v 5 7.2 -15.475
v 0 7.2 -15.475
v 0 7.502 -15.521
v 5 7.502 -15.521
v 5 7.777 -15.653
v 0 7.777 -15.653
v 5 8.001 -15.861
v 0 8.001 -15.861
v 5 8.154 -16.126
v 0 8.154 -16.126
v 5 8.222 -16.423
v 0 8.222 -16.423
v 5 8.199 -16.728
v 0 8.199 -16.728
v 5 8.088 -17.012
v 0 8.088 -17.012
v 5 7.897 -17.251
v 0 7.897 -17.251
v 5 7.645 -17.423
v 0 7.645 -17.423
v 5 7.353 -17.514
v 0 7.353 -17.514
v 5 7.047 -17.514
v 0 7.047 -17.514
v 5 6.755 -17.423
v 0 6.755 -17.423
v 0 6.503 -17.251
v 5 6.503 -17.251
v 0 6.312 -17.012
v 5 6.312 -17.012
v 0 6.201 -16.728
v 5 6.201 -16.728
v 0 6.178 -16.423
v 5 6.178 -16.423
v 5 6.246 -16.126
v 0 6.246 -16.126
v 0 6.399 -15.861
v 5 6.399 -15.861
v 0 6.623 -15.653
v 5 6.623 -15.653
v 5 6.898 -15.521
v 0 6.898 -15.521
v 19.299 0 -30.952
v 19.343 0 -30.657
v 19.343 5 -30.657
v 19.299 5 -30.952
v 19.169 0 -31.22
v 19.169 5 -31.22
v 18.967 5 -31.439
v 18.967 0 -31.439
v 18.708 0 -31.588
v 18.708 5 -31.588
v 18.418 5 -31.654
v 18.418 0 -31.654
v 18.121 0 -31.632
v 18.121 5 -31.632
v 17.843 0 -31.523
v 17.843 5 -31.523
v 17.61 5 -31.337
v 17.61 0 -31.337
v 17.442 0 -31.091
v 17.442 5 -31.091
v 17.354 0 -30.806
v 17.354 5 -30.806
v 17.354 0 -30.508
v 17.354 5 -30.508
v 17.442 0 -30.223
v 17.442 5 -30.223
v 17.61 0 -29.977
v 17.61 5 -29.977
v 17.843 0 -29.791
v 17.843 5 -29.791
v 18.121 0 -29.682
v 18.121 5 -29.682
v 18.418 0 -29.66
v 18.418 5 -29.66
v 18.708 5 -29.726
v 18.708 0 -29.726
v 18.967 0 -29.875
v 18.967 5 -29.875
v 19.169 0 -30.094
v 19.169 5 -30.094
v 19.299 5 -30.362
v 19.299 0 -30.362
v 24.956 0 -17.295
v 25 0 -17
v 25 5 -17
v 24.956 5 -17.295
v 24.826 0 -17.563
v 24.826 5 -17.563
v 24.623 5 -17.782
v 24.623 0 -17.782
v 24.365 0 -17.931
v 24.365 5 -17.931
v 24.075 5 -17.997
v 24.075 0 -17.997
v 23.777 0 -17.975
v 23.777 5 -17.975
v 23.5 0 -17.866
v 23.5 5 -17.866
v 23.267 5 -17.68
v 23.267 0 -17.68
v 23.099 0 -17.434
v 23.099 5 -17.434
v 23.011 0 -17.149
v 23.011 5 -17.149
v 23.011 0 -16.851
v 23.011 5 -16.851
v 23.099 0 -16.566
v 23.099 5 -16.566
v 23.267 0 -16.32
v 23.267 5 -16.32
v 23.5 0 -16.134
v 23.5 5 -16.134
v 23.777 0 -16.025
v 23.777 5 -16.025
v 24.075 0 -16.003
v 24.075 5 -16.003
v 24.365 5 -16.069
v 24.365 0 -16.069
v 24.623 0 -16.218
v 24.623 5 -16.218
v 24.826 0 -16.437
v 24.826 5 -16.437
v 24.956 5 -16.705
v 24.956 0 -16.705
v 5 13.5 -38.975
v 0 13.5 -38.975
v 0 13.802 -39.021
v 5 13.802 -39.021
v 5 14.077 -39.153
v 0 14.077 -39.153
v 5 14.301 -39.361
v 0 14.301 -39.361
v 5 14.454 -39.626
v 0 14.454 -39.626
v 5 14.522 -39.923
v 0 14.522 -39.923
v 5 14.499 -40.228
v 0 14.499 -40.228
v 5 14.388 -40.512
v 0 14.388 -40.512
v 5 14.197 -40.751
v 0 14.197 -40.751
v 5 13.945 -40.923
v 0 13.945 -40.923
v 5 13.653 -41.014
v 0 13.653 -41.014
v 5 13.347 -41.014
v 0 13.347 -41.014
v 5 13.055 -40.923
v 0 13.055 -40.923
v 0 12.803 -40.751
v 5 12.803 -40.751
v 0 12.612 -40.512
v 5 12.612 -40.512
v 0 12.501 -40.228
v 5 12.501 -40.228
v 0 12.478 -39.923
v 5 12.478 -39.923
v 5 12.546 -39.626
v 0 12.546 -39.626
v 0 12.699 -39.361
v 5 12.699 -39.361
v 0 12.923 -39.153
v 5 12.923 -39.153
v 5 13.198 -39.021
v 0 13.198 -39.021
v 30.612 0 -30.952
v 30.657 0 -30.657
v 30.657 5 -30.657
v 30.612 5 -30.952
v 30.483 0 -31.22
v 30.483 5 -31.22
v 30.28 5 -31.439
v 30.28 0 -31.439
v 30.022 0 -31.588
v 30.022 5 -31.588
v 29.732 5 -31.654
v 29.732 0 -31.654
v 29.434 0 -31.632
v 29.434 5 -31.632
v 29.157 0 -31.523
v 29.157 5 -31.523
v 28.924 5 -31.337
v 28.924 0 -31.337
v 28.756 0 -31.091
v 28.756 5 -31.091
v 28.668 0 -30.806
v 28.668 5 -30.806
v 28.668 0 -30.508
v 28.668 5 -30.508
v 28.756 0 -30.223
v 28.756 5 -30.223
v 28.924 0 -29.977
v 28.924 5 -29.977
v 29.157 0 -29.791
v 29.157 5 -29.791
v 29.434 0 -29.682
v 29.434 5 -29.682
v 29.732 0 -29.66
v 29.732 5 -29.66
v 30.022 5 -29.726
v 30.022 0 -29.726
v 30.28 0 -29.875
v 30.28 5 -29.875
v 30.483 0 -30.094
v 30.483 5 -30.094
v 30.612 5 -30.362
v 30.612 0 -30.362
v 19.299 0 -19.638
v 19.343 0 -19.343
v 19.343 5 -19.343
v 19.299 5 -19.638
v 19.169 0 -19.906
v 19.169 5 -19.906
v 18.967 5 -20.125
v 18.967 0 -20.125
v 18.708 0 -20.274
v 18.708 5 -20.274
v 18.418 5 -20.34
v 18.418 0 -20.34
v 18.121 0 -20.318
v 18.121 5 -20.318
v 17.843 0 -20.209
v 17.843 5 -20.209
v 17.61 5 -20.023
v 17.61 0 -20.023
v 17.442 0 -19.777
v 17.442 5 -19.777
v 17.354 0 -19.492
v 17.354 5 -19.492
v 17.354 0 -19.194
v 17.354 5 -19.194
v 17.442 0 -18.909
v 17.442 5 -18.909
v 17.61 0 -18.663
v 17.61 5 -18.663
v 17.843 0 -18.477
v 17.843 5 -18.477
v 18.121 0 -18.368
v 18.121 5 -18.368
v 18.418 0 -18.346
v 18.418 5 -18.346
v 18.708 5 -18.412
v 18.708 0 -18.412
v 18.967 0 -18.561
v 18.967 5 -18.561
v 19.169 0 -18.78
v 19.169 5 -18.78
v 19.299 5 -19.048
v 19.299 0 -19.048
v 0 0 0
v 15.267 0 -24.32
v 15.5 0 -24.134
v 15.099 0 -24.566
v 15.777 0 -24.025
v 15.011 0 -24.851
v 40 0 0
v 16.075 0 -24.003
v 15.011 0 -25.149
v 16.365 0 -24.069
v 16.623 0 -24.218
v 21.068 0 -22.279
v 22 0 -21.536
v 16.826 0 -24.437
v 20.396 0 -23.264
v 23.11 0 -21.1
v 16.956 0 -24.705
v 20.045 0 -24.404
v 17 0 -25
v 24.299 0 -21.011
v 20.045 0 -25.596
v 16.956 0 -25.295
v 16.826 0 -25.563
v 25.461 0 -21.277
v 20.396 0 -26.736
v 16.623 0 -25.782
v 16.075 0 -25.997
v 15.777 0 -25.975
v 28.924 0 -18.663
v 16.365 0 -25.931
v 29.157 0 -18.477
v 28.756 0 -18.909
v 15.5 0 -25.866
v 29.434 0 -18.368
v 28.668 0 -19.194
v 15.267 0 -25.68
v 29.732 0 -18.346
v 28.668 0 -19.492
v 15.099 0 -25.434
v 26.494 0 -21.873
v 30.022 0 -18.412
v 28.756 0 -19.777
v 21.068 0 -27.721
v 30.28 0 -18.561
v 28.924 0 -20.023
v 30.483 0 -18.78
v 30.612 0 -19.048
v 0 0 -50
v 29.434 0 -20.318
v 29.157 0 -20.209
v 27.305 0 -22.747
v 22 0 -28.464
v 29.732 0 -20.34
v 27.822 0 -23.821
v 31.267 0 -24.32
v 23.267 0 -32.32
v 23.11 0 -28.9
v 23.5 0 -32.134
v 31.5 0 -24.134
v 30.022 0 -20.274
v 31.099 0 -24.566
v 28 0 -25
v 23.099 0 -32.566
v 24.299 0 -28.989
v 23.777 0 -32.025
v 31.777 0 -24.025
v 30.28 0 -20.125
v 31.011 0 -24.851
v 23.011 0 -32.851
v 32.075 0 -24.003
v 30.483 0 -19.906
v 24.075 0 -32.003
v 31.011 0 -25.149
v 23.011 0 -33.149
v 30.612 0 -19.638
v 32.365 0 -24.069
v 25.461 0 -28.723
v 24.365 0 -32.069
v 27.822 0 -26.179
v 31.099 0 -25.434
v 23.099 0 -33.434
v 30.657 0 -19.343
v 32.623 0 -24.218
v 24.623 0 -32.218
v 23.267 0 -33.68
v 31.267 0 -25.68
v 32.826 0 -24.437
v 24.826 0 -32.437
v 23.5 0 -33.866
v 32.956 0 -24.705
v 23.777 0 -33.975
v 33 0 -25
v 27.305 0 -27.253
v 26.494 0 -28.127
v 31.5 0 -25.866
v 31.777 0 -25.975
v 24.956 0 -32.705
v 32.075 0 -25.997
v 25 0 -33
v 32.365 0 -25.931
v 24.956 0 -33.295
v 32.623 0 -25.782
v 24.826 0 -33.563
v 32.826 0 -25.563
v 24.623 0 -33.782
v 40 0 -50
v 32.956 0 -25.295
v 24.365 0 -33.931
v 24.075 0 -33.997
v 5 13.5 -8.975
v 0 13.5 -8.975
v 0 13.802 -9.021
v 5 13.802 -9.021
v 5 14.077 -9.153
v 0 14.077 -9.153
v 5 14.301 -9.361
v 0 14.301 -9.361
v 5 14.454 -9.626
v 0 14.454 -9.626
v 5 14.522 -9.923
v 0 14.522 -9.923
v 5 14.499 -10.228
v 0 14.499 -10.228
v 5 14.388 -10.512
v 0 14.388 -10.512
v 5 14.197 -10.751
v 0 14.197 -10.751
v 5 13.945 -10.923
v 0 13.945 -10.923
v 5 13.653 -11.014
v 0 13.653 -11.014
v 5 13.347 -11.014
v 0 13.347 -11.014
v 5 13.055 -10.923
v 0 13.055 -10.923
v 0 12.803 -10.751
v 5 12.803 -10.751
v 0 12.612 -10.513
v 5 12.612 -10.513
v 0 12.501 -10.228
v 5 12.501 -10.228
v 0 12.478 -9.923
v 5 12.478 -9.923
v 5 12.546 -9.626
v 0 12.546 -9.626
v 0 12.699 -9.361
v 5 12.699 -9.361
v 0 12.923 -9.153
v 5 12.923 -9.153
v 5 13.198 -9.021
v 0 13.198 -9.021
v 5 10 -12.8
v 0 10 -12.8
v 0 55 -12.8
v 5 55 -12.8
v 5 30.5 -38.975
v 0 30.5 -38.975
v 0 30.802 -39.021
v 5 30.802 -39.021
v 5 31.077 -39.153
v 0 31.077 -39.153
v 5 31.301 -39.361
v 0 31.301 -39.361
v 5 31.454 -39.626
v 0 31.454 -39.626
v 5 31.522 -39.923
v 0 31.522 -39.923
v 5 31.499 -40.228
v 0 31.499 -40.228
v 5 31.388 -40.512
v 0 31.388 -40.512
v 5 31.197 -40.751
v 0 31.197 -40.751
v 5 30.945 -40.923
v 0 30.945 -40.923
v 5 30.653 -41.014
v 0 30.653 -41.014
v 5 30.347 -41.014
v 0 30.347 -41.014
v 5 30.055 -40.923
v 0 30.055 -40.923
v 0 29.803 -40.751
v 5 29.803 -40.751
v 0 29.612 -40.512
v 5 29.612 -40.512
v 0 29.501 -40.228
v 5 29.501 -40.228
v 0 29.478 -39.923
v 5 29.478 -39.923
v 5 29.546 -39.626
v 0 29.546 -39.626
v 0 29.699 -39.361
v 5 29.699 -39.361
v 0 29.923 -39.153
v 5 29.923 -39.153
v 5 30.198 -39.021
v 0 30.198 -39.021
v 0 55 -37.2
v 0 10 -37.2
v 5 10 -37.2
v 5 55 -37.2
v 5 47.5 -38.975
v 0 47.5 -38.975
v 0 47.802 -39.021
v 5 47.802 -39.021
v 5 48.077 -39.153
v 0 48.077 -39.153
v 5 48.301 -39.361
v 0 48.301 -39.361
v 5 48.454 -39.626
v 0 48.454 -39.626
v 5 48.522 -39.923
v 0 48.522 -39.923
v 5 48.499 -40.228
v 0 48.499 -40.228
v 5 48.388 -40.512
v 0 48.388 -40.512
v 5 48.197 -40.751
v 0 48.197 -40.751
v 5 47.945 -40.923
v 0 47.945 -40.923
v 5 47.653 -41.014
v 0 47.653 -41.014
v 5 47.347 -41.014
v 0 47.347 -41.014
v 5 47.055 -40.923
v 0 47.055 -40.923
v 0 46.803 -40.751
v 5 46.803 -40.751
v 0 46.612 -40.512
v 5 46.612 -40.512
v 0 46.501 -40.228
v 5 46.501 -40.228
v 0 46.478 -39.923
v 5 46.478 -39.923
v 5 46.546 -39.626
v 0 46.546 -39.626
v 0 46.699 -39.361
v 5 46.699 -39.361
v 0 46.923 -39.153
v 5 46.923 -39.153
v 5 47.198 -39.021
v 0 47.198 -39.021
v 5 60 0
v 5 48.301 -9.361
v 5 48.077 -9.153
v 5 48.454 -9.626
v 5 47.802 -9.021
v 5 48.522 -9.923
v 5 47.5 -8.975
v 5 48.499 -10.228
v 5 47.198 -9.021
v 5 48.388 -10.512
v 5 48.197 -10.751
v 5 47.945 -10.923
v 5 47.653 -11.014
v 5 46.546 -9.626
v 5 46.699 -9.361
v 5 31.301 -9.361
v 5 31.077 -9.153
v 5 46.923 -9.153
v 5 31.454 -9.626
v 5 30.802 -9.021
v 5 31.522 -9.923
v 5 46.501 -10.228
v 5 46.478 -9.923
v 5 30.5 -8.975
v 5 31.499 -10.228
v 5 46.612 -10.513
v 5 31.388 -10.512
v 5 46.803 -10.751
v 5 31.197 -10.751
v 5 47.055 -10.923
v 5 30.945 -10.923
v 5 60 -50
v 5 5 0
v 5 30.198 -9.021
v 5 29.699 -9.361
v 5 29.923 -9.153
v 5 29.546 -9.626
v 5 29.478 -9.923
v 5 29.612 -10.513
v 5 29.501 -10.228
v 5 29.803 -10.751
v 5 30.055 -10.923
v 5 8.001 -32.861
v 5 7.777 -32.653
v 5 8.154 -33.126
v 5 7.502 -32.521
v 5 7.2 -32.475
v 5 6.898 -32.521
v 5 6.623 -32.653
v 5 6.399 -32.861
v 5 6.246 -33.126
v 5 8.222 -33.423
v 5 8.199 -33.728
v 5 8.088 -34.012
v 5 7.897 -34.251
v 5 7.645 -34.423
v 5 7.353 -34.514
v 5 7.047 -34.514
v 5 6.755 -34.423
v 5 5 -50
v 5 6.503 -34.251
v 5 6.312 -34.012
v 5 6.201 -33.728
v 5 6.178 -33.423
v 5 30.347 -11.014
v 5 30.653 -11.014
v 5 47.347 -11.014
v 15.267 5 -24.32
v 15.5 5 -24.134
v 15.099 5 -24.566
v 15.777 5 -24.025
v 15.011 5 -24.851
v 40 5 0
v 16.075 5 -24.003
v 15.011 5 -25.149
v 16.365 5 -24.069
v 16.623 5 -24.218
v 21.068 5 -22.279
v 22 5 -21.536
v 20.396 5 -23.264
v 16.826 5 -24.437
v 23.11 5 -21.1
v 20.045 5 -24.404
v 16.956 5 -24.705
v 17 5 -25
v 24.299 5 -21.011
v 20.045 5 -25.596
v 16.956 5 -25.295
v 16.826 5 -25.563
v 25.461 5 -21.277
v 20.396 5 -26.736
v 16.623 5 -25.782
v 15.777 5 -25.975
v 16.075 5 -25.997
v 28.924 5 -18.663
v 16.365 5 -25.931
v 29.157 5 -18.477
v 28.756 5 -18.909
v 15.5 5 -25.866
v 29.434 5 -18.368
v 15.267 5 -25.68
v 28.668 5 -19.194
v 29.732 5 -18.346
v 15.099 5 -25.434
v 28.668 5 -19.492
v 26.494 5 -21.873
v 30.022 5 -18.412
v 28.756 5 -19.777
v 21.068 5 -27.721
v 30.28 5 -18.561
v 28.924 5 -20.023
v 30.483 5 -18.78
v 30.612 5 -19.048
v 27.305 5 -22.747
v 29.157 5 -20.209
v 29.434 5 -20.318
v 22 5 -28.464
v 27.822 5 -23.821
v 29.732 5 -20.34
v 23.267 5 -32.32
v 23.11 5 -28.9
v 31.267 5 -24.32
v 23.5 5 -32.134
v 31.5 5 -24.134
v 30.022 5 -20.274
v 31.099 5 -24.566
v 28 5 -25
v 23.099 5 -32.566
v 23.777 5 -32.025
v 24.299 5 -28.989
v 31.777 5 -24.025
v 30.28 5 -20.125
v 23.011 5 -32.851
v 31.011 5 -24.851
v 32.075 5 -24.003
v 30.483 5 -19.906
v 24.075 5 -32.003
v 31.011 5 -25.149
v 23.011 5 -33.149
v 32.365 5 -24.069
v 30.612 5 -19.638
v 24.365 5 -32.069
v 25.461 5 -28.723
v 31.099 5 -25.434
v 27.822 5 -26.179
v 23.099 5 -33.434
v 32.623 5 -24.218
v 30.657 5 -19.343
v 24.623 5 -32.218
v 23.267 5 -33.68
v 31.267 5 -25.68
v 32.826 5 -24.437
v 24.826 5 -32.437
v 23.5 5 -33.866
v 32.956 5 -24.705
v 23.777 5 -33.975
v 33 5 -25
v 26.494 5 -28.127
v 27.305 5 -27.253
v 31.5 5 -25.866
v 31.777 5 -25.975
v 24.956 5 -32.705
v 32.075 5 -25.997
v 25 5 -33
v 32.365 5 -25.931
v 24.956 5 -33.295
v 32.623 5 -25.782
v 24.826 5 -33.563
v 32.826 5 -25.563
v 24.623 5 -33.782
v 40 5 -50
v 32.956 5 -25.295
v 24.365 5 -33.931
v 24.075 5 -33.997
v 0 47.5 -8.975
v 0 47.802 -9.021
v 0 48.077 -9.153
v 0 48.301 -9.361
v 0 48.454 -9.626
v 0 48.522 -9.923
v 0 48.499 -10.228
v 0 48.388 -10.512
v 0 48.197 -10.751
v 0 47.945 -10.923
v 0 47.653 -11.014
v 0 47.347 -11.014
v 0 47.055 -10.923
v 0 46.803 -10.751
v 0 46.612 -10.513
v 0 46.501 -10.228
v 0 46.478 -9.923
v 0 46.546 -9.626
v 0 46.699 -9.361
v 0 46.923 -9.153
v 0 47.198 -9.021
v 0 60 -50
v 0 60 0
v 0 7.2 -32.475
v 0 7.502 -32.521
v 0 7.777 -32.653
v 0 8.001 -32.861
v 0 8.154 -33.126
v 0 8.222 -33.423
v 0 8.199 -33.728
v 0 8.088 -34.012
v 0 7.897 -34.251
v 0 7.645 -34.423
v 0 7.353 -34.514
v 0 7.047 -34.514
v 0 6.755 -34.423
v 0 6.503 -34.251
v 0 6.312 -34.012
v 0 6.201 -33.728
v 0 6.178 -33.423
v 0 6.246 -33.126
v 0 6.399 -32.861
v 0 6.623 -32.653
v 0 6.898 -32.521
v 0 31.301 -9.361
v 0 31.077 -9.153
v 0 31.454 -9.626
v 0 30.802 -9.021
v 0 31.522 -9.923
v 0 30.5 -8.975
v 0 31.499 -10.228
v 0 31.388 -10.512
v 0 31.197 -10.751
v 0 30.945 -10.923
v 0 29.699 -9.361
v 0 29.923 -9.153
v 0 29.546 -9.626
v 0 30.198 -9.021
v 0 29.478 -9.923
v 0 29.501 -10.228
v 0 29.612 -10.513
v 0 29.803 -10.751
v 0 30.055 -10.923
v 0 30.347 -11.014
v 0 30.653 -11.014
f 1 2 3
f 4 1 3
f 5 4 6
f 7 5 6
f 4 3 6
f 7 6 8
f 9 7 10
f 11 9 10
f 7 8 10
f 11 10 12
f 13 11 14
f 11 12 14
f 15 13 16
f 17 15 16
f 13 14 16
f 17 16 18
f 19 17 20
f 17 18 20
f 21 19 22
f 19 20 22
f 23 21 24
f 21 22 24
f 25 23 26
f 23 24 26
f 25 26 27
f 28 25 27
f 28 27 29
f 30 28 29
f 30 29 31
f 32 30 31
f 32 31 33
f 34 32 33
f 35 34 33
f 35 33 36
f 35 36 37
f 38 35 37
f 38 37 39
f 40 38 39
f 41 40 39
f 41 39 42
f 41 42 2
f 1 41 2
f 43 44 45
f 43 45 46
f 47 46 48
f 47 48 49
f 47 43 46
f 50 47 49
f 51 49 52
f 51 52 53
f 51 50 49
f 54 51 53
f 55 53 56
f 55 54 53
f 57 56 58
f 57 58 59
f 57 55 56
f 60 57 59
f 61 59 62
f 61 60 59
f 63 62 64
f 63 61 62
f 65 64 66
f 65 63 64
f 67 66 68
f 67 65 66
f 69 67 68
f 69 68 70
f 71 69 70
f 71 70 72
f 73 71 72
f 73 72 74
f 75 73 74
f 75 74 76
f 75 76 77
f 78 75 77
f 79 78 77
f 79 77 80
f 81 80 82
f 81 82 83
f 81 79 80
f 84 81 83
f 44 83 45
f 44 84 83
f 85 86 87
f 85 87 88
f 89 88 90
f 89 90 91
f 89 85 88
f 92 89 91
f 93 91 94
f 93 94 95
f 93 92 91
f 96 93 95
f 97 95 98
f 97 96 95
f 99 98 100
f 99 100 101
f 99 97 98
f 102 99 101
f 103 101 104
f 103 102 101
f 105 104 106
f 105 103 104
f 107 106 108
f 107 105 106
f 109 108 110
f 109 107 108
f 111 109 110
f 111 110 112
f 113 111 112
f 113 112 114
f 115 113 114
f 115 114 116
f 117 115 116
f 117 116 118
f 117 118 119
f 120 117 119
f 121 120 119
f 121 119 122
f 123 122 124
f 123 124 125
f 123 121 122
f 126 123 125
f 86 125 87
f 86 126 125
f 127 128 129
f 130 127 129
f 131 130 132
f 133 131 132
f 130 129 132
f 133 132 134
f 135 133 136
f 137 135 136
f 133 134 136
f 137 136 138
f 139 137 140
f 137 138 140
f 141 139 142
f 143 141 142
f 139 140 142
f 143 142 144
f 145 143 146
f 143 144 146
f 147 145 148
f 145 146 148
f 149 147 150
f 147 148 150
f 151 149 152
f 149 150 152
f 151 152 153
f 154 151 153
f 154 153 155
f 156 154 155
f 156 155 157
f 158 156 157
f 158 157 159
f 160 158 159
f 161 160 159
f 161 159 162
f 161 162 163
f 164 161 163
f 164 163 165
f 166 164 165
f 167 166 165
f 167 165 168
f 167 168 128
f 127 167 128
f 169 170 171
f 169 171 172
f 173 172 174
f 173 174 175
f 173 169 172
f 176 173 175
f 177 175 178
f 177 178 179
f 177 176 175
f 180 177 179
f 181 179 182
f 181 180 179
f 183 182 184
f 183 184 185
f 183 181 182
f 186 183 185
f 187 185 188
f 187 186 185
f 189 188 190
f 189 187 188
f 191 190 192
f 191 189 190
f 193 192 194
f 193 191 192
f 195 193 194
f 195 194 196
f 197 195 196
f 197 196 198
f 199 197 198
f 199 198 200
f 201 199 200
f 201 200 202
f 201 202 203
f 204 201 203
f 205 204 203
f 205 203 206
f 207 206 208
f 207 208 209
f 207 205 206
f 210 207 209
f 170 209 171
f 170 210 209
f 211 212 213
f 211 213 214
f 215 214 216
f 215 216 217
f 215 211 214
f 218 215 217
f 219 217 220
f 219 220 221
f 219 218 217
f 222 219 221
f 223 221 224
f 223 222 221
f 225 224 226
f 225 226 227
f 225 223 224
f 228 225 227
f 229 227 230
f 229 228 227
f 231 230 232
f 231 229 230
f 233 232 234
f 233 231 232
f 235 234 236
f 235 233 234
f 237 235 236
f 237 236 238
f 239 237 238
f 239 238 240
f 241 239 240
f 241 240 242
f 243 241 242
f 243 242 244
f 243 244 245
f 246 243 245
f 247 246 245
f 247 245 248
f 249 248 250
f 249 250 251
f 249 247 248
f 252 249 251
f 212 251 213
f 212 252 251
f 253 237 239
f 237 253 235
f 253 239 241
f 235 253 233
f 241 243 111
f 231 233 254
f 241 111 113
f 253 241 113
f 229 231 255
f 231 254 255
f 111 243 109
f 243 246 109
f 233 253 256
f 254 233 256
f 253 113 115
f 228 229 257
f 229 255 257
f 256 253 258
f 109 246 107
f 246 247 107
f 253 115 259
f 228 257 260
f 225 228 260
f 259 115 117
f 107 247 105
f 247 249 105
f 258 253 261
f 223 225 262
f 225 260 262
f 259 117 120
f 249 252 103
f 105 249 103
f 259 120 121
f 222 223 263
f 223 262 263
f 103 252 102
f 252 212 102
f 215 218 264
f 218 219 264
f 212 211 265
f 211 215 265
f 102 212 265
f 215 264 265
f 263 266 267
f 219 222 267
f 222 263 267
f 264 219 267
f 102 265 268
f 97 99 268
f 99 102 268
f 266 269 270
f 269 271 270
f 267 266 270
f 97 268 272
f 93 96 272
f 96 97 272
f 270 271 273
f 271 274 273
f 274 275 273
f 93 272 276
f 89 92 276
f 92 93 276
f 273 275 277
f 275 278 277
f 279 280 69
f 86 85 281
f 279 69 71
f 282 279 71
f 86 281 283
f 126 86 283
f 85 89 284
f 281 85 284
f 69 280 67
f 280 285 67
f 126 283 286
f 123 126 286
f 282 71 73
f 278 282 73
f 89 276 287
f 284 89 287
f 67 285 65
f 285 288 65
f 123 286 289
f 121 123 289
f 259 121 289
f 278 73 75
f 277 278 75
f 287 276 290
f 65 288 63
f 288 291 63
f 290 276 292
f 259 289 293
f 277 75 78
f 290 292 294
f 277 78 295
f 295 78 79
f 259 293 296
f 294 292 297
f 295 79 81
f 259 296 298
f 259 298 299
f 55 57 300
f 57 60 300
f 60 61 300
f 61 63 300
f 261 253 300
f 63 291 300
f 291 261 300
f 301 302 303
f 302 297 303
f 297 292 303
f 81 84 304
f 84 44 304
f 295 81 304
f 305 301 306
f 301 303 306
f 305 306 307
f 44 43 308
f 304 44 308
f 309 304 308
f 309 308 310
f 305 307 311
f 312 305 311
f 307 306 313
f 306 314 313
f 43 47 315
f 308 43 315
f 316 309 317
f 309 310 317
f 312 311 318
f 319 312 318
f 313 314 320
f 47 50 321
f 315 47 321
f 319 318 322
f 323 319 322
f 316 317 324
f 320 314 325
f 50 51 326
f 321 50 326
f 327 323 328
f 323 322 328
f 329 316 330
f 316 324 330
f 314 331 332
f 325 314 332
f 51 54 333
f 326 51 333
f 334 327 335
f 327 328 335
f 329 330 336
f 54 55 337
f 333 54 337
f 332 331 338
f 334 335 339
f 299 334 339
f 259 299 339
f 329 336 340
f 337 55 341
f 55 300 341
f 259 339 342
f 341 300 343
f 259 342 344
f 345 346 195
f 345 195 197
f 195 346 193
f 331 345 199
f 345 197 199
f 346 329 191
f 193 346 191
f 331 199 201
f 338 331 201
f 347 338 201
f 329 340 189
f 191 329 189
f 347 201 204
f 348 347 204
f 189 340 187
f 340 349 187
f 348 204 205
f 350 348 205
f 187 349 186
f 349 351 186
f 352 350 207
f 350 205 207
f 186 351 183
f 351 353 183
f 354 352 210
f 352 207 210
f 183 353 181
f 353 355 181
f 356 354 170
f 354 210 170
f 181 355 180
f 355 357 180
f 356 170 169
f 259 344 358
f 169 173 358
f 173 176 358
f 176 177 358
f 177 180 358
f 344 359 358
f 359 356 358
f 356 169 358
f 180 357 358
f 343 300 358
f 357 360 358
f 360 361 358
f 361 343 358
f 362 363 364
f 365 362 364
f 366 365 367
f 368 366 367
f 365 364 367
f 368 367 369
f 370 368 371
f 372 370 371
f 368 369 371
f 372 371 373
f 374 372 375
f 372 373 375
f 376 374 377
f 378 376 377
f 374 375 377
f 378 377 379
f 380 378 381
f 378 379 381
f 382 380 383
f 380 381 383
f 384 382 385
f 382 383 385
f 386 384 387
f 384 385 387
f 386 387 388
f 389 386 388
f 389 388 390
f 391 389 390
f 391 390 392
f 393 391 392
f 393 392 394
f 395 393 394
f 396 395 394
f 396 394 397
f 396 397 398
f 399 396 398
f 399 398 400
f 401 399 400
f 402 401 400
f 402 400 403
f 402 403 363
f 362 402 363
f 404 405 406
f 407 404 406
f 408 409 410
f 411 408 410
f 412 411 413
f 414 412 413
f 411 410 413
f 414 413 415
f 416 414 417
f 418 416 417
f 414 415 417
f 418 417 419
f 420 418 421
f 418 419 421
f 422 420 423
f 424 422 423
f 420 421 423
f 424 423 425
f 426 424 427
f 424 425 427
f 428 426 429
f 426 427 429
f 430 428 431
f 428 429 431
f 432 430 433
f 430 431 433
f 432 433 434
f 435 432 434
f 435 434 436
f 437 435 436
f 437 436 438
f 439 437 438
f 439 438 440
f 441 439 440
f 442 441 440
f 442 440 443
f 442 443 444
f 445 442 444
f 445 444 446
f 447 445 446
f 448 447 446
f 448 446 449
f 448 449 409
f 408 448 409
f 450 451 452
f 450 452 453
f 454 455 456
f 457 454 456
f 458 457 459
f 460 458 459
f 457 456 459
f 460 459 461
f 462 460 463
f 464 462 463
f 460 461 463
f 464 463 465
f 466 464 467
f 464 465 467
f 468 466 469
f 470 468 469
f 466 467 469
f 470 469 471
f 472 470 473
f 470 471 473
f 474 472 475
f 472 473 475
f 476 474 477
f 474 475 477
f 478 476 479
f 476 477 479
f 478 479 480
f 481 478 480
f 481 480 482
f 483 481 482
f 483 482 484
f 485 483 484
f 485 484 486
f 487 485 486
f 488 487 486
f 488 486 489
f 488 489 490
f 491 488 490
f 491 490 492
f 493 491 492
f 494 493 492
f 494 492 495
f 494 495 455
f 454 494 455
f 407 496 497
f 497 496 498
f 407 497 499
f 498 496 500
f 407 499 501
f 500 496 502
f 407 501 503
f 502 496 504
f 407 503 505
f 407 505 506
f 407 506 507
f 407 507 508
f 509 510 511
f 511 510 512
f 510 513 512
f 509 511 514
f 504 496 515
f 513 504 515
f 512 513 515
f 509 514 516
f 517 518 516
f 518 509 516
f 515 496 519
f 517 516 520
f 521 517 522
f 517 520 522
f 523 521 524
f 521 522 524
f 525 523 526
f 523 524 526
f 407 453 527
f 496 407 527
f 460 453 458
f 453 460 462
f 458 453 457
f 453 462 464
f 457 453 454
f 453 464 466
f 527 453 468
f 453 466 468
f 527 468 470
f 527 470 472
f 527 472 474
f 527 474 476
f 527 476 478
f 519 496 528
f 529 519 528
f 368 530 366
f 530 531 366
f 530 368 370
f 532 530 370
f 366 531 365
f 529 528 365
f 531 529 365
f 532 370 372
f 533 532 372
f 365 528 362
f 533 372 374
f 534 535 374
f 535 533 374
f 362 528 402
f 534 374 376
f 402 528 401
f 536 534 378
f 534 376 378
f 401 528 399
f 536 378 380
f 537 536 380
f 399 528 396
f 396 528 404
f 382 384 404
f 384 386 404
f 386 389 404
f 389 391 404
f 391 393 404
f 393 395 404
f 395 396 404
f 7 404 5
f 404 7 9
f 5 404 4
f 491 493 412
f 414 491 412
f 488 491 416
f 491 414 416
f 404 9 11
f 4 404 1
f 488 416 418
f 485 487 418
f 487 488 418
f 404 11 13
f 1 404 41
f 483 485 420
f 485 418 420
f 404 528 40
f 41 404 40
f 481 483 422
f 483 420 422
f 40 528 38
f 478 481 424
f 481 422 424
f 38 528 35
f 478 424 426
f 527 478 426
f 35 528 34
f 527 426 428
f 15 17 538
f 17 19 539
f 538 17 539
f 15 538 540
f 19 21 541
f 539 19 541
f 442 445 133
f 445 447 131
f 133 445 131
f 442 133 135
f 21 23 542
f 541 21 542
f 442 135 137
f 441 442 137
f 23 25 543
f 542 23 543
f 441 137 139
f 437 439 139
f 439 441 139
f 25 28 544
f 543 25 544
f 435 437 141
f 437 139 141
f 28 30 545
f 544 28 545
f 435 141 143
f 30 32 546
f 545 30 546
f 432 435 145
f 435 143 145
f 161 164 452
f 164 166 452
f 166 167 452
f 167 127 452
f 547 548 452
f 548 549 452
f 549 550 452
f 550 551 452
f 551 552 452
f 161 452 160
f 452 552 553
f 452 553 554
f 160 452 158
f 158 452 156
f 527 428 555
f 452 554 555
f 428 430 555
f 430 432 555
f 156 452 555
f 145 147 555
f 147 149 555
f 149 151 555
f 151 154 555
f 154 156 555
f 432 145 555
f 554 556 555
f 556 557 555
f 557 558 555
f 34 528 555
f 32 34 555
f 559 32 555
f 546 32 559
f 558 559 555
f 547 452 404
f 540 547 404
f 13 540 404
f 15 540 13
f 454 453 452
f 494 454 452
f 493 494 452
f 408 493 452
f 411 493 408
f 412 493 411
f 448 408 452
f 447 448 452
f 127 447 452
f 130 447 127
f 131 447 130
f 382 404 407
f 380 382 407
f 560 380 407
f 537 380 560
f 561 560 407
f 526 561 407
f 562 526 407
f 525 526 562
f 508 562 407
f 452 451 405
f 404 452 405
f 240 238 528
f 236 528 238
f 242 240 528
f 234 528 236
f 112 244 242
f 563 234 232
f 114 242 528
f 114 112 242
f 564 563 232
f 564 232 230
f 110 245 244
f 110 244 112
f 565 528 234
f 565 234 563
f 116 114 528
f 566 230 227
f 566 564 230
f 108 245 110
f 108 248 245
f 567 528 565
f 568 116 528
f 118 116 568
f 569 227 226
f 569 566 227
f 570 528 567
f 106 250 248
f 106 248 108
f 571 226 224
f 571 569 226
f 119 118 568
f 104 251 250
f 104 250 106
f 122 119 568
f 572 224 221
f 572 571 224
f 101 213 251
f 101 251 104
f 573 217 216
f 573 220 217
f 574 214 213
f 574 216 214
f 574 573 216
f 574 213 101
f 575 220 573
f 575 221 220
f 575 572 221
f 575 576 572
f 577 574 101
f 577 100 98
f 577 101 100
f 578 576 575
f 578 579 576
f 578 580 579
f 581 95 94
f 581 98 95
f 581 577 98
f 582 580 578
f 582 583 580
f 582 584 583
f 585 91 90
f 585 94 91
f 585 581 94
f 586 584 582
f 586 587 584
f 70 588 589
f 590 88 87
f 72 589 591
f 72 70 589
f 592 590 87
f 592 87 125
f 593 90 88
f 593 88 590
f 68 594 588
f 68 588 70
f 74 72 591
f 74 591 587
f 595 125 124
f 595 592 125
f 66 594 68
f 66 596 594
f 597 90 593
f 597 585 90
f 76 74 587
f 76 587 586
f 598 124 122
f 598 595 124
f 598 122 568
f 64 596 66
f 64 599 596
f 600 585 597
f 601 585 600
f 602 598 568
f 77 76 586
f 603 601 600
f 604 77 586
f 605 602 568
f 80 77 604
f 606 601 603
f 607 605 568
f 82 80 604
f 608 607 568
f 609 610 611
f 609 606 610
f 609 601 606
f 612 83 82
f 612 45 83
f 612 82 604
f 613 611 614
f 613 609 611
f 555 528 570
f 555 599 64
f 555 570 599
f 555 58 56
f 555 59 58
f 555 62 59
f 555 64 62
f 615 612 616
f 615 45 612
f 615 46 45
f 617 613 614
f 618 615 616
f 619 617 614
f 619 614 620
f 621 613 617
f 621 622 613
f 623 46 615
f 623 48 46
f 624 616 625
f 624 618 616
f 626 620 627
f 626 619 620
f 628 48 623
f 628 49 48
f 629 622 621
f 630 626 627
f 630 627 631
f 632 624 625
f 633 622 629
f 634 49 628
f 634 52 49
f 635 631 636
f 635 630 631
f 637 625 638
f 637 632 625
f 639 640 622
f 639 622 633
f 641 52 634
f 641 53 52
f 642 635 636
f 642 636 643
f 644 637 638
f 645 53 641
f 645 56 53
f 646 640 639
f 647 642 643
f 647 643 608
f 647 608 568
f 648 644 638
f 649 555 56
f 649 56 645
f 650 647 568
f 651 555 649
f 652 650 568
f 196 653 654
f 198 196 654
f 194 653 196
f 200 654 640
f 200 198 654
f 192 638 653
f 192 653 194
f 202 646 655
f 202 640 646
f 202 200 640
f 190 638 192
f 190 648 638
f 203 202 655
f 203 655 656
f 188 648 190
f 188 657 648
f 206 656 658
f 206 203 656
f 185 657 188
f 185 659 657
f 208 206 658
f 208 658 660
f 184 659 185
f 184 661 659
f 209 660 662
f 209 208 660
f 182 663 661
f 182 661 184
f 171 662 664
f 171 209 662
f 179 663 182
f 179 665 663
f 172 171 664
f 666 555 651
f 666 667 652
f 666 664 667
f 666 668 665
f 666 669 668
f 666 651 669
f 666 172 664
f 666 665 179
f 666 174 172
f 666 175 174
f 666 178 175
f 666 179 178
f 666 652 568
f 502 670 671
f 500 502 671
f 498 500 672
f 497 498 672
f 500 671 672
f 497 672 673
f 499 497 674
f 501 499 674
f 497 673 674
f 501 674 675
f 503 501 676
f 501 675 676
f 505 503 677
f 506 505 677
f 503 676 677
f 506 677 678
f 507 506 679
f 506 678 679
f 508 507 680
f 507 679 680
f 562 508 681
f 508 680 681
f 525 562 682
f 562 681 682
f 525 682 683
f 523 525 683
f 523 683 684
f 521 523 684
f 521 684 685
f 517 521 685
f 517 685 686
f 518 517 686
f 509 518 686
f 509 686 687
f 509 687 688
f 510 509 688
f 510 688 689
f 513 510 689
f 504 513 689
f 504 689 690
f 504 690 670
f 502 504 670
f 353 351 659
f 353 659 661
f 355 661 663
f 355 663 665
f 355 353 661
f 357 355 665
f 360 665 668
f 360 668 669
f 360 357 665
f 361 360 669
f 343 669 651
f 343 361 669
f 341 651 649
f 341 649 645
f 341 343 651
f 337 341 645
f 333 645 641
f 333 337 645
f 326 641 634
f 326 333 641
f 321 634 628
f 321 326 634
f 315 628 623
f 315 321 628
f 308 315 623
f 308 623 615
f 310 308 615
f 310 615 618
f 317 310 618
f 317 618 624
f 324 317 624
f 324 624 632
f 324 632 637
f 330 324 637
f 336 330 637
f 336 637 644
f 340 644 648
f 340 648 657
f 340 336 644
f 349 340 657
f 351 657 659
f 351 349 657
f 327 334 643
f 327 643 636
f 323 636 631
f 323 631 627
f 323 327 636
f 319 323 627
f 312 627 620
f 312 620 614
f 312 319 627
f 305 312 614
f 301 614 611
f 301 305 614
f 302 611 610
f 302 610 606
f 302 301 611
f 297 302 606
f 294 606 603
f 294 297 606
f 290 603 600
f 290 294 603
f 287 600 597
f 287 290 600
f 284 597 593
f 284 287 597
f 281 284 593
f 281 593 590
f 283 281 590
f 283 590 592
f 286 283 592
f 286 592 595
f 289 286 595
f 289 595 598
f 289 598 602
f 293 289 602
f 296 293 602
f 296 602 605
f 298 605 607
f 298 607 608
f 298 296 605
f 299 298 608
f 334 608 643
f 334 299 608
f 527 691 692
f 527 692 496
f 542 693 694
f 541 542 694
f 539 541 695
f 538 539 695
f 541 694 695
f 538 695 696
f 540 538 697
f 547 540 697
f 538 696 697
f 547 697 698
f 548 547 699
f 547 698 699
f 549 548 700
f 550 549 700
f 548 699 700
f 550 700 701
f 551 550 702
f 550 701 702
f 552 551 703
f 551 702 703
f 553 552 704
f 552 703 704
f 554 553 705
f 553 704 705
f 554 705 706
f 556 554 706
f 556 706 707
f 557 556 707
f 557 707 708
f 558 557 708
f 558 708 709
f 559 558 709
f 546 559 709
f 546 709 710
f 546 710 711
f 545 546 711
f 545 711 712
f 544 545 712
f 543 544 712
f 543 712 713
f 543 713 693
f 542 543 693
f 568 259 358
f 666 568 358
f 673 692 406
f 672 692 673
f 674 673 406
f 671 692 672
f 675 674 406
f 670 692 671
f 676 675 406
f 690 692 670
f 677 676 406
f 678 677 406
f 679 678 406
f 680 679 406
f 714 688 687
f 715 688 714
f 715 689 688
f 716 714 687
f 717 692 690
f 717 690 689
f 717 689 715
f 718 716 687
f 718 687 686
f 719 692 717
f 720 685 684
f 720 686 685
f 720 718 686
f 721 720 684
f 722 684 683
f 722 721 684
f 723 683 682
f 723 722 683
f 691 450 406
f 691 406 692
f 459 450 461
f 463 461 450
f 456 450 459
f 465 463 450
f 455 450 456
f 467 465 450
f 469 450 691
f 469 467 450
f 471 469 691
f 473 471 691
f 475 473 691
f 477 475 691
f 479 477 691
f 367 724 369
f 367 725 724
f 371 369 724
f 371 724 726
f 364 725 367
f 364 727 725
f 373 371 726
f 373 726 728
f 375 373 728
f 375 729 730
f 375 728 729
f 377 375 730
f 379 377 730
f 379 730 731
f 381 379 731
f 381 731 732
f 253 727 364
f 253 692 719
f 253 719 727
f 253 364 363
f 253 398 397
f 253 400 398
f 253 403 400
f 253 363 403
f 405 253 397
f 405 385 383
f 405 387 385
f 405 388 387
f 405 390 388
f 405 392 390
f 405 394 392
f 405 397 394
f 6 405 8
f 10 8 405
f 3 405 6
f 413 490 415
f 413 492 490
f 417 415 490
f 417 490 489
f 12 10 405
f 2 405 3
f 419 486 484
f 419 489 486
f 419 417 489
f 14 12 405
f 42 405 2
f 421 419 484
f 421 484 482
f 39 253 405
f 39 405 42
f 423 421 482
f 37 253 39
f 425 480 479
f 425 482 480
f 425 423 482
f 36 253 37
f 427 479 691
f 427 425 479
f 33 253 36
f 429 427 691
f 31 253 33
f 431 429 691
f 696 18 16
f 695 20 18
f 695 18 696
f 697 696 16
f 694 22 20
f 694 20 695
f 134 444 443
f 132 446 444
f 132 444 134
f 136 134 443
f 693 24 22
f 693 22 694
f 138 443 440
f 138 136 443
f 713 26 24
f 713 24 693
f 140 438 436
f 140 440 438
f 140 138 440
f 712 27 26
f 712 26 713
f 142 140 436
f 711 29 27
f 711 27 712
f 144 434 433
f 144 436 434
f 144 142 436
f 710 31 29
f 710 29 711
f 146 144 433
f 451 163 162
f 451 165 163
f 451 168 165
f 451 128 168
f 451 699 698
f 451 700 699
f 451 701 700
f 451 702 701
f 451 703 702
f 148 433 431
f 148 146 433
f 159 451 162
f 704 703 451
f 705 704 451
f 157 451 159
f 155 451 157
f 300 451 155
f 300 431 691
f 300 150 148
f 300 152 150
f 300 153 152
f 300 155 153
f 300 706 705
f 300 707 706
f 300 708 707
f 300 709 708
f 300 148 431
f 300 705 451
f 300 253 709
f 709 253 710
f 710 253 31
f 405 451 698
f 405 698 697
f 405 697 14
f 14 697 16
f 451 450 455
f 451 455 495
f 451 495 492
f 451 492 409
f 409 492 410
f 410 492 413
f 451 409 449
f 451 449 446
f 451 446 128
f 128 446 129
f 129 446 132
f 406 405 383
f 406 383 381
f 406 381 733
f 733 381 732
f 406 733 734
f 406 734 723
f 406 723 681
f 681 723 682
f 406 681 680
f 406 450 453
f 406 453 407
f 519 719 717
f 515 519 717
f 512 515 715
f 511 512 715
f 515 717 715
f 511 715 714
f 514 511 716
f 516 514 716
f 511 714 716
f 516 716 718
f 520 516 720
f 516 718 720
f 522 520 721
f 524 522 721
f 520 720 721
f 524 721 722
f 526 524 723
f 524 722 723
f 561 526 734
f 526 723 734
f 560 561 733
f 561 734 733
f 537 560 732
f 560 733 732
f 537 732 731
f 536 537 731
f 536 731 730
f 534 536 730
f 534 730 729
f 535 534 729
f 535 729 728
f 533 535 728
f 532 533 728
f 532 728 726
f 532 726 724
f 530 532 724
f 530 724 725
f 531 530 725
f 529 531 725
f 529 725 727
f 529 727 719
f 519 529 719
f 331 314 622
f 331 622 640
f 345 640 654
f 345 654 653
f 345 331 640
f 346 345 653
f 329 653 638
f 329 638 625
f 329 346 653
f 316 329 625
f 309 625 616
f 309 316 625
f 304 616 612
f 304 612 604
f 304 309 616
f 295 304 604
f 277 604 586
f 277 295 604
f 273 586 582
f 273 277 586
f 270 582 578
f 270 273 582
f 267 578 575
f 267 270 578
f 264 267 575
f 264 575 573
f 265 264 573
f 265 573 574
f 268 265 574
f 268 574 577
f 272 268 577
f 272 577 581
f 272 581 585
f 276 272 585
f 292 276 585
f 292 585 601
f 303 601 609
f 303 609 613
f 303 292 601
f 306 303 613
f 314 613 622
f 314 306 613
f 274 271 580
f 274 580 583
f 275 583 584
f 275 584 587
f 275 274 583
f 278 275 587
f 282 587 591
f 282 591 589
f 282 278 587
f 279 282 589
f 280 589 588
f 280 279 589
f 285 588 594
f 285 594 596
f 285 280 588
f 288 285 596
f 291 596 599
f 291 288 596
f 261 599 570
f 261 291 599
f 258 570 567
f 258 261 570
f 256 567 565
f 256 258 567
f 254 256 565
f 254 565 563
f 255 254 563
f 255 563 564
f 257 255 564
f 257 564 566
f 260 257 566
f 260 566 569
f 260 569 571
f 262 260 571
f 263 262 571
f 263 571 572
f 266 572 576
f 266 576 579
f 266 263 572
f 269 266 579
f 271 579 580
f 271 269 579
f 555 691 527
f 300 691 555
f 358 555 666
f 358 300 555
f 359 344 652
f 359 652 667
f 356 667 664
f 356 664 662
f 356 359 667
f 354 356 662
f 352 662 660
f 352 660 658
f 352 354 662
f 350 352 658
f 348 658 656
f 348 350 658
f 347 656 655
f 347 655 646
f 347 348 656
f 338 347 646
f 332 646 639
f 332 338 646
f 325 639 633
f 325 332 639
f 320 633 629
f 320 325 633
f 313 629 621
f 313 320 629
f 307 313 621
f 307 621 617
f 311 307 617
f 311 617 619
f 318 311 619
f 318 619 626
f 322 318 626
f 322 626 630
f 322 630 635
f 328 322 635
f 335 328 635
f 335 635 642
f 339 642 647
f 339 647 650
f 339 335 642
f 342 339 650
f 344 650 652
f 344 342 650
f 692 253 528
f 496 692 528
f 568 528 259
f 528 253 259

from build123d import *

# Parameters (mm, degrees)
SKETCH1_W           = 40
SKETCH1_H           = 50
SKETCH1_R           = 4
SKETCH1_R_2         = 1
BOSS_EXTRUDE1_DEPTH = 5
SKETCH3_W           = 5
SKETCH3_H           = 50
BOSS_EXTRUDE2_DEPTH = 60
SKETCH4_R           = 1.025
SKETCH4_W           = 24.4
SKETCH4_H           = 45
CUT_EXTRUDE1_DEPTH  = 41


with BuildPart() as part:
    # Sketch1 → Boss-Extrude1 (new body)
    with BuildSketch(Plane(origin=(0, 0, 0), x_dir=(1, 0, 0), z_dir=(0, 1, 0))):
        with Locations((20, 25)):
            Rectangle(SKETCH1_W, SKETCH1_H)
        with Locations((24, 25)):
            Circle(SKETCH1_R, mode=Mode.SUBTRACT)
        with Locations((24, 33)):
            Circle(SKETCH1_R_2, mode=Mode.SUBTRACT)
        with Locations((29.656854249, 30.656854249)):
            Circle(SKETCH1_R_2, mode=Mode.SUBTRACT)
        with Locations((32, 25)):
            Circle(SKETCH1_R_2, mode=Mode.SUBTRACT)
        with Locations((29.656854249, 19.343145751)):
            Circle(SKETCH1_R_2, mode=Mode.SUBTRACT)
        with Locations((24, 17)):
            Circle(SKETCH1_R_2, mode=Mode.SUBTRACT)
        with Locations((18.343145751, 19.343145751)):
            Circle(SKETCH1_R_2, mode=Mode.SUBTRACT)
        with Locations((16, 25)):
            Circle(SKETCH1_R_2, mode=Mode.SUBTRACT)
        with Locations((18.343145751, 30.656854249)):
            Circle(SKETCH1_R_2, mode=Mode.SUBTRACT)
    extrude(amount=BOSS_EXTRUDE1_DEPTH)

    # Sketch3 → Boss-Extrude2 (add)
    with BuildSketch(Plane(origin=(0, 0, 0), x_dir=(1, 0, 0), z_dir=(0, 1, 0))):
        with Locations((2.5, 25)):
            Rectangle(SKETCH3_W, SKETCH3_H)
    extrude(amount=BOSS_EXTRUDE2_DEPTH)

    # Sketch4 → Cut-Extrude1 (cut, through all)
    with BuildSketch(Plane.ZY):
        with Locations((-40, 47.5)):
            Circle(SKETCH4_R)
        with Locations((-10, 47.5)):
            Circle(SKETCH4_R)
        with Locations((-40, 30.5)):
            Circle(SKETCH4_R)
        with Locations((-10, 30.5)):
            Circle(SKETCH4_R)
        with Locations((-40, 13.5)):
            Circle(SKETCH4_R)
        with Locations((-33.5, 7.2)):
            Circle(SKETCH4_R)
        with Locations((-16.5, 7.2)):
            Circle(SKETCH4_R)
        with Locations((-10, 13.5)):
            Circle(SKETCH4_R)
        with Locations((-25, 32.5)):
            Rectangle(SKETCH4_W, SKETCH4_H)
    extrude(amount=-CUT_EXTRUDE1_DEPTH, mode=Mode.SUBTRACT)


solid = part.part
